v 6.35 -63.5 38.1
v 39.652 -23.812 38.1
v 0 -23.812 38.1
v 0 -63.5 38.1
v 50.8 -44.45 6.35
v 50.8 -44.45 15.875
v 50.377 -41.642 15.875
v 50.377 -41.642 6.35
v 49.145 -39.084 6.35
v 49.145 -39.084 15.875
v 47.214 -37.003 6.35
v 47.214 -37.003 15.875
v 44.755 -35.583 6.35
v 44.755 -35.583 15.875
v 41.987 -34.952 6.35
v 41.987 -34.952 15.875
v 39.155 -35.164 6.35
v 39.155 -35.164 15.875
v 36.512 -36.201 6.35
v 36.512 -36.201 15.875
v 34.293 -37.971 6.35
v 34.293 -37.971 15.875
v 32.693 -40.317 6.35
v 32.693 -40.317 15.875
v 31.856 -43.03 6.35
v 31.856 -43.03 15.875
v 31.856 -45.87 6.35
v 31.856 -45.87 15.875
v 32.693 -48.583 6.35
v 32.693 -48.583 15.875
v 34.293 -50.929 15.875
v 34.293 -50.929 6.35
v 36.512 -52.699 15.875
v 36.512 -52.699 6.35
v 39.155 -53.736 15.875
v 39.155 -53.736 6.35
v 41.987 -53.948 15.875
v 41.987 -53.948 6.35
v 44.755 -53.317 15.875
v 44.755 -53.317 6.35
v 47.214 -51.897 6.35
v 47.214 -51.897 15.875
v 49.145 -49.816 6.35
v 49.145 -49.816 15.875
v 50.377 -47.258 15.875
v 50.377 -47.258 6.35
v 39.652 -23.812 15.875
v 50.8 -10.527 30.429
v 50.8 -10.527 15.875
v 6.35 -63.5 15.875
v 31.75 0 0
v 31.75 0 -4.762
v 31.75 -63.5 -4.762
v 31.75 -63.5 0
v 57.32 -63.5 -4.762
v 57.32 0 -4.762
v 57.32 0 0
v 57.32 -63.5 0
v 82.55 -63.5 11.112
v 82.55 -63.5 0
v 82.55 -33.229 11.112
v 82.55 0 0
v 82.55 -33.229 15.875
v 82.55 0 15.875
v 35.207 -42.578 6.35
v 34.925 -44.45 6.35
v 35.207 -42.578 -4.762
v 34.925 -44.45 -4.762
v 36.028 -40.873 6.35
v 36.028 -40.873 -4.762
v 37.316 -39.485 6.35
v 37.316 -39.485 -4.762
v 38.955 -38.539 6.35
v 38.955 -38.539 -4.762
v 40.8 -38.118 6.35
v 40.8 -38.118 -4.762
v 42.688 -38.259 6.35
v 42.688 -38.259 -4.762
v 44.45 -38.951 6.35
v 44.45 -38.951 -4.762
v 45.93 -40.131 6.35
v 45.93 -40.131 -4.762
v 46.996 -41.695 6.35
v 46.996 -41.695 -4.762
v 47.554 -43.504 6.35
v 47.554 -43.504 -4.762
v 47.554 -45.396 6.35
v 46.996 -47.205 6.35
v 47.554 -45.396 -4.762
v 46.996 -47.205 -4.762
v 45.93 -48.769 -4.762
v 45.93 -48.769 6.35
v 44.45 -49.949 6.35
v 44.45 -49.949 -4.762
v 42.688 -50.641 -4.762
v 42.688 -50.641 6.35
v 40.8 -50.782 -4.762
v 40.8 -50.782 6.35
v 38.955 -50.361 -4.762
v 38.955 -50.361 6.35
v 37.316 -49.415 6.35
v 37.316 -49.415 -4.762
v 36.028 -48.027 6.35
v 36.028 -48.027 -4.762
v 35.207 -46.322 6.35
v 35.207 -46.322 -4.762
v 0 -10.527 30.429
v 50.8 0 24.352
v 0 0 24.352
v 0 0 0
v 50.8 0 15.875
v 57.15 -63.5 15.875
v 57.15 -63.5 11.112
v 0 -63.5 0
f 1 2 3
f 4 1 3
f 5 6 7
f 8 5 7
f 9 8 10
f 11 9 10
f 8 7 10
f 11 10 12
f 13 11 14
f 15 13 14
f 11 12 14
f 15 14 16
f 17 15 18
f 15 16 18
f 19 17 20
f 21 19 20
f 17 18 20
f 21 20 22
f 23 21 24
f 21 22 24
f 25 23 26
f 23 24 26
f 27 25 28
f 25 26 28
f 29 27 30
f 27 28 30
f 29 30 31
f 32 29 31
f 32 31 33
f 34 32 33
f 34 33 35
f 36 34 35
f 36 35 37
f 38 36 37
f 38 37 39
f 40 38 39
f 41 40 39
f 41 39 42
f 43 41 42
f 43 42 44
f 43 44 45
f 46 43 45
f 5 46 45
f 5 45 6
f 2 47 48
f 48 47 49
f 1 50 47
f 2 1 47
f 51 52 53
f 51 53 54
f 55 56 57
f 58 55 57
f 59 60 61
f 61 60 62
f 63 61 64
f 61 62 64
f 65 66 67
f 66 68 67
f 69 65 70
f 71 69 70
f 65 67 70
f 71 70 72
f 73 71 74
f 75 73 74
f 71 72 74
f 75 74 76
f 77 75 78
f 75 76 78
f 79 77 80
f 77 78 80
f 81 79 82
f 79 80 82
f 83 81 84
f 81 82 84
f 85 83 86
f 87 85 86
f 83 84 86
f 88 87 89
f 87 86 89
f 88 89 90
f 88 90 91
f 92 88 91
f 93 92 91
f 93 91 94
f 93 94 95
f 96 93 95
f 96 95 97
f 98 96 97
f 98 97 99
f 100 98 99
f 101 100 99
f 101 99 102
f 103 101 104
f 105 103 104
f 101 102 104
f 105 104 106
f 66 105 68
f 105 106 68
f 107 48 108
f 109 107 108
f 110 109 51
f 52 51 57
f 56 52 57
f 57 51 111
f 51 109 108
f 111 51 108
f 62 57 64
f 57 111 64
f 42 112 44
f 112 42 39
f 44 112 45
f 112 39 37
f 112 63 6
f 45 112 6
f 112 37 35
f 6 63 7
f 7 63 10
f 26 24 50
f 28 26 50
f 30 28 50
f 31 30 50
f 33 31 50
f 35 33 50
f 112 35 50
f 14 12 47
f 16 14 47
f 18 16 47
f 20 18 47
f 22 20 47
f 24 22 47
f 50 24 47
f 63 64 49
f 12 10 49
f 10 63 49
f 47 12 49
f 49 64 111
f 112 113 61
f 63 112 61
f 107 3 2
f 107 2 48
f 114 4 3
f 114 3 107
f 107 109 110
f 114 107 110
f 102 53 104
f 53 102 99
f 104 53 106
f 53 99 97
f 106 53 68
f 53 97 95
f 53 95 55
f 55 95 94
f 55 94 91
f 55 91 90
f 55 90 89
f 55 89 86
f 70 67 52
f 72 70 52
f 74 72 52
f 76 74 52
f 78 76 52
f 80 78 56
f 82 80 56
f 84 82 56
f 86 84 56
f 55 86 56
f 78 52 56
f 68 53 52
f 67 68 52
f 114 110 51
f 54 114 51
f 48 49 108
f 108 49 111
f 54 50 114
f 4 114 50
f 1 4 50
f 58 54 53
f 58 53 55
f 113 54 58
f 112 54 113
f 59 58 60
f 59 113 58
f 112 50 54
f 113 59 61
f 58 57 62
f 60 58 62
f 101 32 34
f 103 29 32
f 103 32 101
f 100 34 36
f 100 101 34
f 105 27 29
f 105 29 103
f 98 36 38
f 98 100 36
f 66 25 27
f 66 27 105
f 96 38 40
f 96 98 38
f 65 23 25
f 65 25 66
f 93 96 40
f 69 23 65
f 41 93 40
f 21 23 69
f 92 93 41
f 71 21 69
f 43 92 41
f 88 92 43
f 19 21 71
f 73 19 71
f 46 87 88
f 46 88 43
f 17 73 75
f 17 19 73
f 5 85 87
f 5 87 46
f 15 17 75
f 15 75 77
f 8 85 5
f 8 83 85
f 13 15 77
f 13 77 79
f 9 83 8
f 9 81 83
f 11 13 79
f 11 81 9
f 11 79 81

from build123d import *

# Parameters (mm, degrees)
F0_W           = 25.5704697987
F0_H           = 4.7625
F1_DEPTH       = 63.5
F3_DEPTH       = 15.875
F2_W           = 33.3017666123
F2_H           = 23.8125
F4_DEPTH       = 38.1
F6_D           = 12.7
F6_CBORE_D     = 19.05
F6_CBORE_DEPTH = 9.525
F8_DEPTH       = 50.8


with BuildPart() as f1:
    # F0 (on Front) → F1 (new body)
    with BuildSketch(Plane.XZ):
        Polygon((6.35, 15.875), (6.35, 0), (31.75, 0), (57.3204697987, 0), (82.55, 0), (82.55, 11.1125), (57.15, 11.1125), (57.15, 15.875), align=None)
        Polygon((0, 38.1), (0, 0), (6.35, 0), (6.35, 15.875), (6.35, 38.1), align=None)
        with Locations((44.5352348993, -2.38125)):
            Rectangle(F0_W, F0_H)
    extrude(amount=F1_DEPTH)

    # F2 (on Top) → F3 (join)
    with BuildSketch(Plane.XY):
        Polygon((82.55, -33.2294587481), (82.55, 0), (50.8, 0), (50.8, -10.5265528092), (39.6517666123, -23.8125), (6.35, -63.5), (41.275, -63.5), (57.15, -63.5), align=None)
    extrude(amount=F3_DEPTH)

    # F2 (on Top) → F4 (join)
    with BuildSketch(Plane.XY):
        with Locations((23.0008833062, -11.90625)):
            Rectangle(F2_W, F2_H)
        Polygon((50.8, -10.5265528092), (50.8, 0), (39.6517666123, 0), (39.6517666123, -23.8125), align=None)
        Polygon((6.35, -63.5), (39.6517666123, -23.8125), (6.35, -23.8125), align=None)
    extrude(amount=F4_DEPTH)

    # F6 (through all)
    with Locations(Plane.XY.offset(15.875)):
        with Locations((41.275, -44.45)):
            CounterBoreHole(F6_D / 2, F6_CBORE_D / 2, F6_CBORE_DEPTH)

    # F7 (on face) → F8 (cut)
    with BuildSketch(Plane.YZ.offset(50.8)):
        Polygon((-10.5265528092, 30.4293548129), (-10.5265528092, 38.1), (-23.8125, 38.1), align=None)
        Polygon((0, 24.3518467149), (0, 38.1), (-10.5265528092, 38.1), (-10.5265528092, 30.4293548129), align=None)
    extrude(amount=-F8_DEPTH, mode=Mode.SUBTRACT)


solid = f1.part
